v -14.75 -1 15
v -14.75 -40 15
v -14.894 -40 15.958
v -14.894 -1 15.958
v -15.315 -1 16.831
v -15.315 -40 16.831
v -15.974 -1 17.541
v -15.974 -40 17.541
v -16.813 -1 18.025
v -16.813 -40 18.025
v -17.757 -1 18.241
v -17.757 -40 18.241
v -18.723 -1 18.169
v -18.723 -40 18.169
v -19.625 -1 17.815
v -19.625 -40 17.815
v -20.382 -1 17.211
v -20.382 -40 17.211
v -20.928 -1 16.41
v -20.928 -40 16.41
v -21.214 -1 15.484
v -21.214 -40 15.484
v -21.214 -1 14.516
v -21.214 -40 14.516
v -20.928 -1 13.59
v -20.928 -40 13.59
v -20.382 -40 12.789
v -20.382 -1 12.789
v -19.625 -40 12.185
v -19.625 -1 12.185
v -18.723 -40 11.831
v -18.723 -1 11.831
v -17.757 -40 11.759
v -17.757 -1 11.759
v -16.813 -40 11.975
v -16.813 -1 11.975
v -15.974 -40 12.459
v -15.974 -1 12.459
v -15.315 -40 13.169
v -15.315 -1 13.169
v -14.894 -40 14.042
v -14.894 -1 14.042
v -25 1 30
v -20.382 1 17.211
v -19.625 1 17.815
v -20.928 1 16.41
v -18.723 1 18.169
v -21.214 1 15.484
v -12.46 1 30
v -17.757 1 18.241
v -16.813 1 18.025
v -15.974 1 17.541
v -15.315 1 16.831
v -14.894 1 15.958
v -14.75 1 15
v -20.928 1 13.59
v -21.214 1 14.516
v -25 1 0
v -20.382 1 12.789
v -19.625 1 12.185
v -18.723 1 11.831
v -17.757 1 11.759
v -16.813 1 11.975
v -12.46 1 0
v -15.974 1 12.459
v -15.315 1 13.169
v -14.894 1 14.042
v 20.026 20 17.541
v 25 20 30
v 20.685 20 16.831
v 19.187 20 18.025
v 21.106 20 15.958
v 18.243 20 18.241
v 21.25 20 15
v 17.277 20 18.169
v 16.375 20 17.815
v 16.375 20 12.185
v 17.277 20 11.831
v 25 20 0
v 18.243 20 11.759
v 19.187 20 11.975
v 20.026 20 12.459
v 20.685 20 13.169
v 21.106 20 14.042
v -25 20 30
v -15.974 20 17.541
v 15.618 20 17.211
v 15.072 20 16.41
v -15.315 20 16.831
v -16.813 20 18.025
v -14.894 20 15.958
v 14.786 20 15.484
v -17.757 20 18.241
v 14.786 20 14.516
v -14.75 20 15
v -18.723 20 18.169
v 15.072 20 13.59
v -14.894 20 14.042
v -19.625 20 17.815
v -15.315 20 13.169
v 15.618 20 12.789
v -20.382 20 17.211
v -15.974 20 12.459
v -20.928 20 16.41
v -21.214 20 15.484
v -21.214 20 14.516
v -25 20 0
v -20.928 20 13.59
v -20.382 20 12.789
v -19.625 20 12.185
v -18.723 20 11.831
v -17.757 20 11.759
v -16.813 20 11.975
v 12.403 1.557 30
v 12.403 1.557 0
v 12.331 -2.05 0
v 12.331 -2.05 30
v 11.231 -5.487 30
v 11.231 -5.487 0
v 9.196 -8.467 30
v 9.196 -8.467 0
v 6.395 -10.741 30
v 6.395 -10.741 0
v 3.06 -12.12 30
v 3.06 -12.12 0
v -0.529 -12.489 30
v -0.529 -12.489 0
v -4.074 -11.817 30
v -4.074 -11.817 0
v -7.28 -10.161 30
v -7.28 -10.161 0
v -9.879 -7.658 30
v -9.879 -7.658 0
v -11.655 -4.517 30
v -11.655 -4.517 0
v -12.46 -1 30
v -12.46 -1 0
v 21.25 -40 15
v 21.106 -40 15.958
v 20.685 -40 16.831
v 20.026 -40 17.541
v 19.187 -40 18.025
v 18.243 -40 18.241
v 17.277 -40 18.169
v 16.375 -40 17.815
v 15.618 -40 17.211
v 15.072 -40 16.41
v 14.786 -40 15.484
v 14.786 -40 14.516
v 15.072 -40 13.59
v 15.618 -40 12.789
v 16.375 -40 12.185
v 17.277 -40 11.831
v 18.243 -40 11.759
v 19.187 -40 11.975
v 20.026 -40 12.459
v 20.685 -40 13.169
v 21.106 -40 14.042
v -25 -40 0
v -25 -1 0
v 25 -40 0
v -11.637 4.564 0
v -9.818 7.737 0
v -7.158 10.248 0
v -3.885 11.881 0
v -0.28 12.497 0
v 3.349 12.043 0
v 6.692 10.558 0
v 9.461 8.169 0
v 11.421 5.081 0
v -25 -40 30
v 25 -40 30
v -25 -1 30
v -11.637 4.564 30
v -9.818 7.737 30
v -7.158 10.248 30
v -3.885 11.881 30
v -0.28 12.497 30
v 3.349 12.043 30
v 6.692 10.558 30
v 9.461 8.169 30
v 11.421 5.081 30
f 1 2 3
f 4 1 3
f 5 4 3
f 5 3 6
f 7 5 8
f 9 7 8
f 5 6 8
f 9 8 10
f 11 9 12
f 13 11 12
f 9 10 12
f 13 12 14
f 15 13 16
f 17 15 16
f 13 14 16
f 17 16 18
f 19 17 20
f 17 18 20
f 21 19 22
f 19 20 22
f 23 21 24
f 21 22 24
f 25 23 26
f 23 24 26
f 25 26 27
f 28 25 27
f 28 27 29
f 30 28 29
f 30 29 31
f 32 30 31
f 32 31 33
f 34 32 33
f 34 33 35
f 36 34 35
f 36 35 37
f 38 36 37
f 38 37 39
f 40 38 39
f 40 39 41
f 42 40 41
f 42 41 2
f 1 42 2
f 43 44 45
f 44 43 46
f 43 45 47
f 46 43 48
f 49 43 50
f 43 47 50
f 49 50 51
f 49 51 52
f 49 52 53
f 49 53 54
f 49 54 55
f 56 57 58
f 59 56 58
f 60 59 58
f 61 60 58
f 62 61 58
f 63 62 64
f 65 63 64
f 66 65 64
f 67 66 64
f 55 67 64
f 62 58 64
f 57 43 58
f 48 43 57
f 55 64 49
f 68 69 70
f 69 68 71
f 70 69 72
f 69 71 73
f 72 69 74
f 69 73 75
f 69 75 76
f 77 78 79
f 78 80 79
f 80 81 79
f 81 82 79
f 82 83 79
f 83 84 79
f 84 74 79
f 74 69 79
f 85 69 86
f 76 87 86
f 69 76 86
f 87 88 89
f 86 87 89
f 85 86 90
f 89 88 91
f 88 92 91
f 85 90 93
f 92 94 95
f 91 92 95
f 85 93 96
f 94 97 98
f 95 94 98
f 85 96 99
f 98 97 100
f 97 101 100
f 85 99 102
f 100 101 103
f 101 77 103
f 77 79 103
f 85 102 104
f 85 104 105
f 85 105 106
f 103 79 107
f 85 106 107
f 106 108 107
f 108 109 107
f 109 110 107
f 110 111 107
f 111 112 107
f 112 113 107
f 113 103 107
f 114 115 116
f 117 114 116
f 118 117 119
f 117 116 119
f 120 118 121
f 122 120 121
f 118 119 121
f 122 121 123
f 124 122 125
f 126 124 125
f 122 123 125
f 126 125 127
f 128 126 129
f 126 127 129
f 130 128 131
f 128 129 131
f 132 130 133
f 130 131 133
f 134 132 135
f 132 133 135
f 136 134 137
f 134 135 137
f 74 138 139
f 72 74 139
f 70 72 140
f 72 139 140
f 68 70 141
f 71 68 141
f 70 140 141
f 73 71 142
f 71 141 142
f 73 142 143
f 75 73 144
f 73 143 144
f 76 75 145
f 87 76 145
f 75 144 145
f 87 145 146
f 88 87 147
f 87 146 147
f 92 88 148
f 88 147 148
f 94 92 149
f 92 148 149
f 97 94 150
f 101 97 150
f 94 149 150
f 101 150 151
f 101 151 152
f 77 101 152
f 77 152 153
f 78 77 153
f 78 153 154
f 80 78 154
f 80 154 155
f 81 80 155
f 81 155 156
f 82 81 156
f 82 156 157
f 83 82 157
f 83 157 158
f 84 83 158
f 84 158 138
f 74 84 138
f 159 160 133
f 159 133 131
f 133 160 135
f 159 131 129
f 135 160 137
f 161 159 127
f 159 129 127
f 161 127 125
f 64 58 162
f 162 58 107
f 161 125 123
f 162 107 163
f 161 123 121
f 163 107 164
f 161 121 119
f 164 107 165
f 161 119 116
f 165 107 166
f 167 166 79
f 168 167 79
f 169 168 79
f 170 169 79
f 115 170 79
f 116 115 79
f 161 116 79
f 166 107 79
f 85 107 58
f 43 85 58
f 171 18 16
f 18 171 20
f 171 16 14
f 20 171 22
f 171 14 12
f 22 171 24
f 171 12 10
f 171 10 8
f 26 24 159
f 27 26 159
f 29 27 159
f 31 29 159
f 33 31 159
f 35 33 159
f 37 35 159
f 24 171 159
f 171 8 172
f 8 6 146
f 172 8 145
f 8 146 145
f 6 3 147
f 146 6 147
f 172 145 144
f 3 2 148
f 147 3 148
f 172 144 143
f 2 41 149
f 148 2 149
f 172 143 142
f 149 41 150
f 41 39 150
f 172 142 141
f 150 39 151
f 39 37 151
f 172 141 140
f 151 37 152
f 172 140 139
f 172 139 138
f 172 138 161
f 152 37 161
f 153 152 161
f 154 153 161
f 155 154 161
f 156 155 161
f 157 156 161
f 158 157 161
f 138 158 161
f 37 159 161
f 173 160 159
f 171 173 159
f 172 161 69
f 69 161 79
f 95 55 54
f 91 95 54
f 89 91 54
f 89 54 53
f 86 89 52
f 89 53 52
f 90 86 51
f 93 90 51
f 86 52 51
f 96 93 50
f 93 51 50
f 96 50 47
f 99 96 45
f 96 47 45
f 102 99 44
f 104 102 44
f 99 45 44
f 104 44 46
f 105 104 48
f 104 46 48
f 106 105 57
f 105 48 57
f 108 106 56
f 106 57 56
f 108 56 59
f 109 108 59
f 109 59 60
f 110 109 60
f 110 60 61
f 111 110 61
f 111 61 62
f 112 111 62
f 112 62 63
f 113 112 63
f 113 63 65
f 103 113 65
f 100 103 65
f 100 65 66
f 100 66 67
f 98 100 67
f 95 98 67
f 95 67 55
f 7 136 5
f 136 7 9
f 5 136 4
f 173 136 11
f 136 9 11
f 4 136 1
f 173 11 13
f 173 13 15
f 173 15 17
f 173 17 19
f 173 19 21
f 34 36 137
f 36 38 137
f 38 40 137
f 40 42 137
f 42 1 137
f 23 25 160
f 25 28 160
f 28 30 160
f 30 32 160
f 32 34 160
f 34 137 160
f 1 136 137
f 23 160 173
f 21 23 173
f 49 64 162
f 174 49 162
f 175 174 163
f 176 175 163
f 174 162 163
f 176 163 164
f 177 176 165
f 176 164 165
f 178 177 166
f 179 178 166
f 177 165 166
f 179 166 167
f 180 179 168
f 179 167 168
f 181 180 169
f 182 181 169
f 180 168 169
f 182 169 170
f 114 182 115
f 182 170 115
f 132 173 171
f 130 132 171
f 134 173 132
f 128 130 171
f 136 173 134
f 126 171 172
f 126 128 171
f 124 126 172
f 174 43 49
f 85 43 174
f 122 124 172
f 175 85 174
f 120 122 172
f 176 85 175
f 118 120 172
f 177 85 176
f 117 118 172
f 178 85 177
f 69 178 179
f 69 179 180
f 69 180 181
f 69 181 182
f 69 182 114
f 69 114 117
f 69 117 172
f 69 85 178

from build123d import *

# Parameters (mm, degrees)
F1_DEPTH = 30
F2_R     = 3.25
F3_DEPTH = 60.001


with BuildPart() as f1:
    # F0 (on Top) → F1 (new body)
    with BuildSketch(Plane.XY):
        with BuildLine():
            Line((-25, -1), (-25, -40))
            Line((-25, -40), (25, -40))
            Line((25, -40), (25, 20))
            Line((25, 20), (-25, 20))
            Line((-25, 20), (-25, 1))
            Line((-25, 1), (-12.459936, 1))
            ThreePointArc((-12.459936, 1), (-0.280101, 12.496861), (12.402618, 1.557262))
            ThreePointArc((12.402618, 1.557262), (1.278952, -12.434399), (-12.459936, -1))
            Line((-12.459936, -1), (-25, -1))
        make_face()
    extrude(amount=F1_DEPTH)

    # F2 (on face) → F3 (cut, through all)
    with BuildSketch(Plane.XZ.offset(40)):
        with Locations((-18, 15)):
            Circle(F2_R)
        with Locations((18, 15)):
            Circle(F2_R)
    extrude(amount=-F3_DEPTH, mode=Mode.SUBTRACT)


solid = f1.part
